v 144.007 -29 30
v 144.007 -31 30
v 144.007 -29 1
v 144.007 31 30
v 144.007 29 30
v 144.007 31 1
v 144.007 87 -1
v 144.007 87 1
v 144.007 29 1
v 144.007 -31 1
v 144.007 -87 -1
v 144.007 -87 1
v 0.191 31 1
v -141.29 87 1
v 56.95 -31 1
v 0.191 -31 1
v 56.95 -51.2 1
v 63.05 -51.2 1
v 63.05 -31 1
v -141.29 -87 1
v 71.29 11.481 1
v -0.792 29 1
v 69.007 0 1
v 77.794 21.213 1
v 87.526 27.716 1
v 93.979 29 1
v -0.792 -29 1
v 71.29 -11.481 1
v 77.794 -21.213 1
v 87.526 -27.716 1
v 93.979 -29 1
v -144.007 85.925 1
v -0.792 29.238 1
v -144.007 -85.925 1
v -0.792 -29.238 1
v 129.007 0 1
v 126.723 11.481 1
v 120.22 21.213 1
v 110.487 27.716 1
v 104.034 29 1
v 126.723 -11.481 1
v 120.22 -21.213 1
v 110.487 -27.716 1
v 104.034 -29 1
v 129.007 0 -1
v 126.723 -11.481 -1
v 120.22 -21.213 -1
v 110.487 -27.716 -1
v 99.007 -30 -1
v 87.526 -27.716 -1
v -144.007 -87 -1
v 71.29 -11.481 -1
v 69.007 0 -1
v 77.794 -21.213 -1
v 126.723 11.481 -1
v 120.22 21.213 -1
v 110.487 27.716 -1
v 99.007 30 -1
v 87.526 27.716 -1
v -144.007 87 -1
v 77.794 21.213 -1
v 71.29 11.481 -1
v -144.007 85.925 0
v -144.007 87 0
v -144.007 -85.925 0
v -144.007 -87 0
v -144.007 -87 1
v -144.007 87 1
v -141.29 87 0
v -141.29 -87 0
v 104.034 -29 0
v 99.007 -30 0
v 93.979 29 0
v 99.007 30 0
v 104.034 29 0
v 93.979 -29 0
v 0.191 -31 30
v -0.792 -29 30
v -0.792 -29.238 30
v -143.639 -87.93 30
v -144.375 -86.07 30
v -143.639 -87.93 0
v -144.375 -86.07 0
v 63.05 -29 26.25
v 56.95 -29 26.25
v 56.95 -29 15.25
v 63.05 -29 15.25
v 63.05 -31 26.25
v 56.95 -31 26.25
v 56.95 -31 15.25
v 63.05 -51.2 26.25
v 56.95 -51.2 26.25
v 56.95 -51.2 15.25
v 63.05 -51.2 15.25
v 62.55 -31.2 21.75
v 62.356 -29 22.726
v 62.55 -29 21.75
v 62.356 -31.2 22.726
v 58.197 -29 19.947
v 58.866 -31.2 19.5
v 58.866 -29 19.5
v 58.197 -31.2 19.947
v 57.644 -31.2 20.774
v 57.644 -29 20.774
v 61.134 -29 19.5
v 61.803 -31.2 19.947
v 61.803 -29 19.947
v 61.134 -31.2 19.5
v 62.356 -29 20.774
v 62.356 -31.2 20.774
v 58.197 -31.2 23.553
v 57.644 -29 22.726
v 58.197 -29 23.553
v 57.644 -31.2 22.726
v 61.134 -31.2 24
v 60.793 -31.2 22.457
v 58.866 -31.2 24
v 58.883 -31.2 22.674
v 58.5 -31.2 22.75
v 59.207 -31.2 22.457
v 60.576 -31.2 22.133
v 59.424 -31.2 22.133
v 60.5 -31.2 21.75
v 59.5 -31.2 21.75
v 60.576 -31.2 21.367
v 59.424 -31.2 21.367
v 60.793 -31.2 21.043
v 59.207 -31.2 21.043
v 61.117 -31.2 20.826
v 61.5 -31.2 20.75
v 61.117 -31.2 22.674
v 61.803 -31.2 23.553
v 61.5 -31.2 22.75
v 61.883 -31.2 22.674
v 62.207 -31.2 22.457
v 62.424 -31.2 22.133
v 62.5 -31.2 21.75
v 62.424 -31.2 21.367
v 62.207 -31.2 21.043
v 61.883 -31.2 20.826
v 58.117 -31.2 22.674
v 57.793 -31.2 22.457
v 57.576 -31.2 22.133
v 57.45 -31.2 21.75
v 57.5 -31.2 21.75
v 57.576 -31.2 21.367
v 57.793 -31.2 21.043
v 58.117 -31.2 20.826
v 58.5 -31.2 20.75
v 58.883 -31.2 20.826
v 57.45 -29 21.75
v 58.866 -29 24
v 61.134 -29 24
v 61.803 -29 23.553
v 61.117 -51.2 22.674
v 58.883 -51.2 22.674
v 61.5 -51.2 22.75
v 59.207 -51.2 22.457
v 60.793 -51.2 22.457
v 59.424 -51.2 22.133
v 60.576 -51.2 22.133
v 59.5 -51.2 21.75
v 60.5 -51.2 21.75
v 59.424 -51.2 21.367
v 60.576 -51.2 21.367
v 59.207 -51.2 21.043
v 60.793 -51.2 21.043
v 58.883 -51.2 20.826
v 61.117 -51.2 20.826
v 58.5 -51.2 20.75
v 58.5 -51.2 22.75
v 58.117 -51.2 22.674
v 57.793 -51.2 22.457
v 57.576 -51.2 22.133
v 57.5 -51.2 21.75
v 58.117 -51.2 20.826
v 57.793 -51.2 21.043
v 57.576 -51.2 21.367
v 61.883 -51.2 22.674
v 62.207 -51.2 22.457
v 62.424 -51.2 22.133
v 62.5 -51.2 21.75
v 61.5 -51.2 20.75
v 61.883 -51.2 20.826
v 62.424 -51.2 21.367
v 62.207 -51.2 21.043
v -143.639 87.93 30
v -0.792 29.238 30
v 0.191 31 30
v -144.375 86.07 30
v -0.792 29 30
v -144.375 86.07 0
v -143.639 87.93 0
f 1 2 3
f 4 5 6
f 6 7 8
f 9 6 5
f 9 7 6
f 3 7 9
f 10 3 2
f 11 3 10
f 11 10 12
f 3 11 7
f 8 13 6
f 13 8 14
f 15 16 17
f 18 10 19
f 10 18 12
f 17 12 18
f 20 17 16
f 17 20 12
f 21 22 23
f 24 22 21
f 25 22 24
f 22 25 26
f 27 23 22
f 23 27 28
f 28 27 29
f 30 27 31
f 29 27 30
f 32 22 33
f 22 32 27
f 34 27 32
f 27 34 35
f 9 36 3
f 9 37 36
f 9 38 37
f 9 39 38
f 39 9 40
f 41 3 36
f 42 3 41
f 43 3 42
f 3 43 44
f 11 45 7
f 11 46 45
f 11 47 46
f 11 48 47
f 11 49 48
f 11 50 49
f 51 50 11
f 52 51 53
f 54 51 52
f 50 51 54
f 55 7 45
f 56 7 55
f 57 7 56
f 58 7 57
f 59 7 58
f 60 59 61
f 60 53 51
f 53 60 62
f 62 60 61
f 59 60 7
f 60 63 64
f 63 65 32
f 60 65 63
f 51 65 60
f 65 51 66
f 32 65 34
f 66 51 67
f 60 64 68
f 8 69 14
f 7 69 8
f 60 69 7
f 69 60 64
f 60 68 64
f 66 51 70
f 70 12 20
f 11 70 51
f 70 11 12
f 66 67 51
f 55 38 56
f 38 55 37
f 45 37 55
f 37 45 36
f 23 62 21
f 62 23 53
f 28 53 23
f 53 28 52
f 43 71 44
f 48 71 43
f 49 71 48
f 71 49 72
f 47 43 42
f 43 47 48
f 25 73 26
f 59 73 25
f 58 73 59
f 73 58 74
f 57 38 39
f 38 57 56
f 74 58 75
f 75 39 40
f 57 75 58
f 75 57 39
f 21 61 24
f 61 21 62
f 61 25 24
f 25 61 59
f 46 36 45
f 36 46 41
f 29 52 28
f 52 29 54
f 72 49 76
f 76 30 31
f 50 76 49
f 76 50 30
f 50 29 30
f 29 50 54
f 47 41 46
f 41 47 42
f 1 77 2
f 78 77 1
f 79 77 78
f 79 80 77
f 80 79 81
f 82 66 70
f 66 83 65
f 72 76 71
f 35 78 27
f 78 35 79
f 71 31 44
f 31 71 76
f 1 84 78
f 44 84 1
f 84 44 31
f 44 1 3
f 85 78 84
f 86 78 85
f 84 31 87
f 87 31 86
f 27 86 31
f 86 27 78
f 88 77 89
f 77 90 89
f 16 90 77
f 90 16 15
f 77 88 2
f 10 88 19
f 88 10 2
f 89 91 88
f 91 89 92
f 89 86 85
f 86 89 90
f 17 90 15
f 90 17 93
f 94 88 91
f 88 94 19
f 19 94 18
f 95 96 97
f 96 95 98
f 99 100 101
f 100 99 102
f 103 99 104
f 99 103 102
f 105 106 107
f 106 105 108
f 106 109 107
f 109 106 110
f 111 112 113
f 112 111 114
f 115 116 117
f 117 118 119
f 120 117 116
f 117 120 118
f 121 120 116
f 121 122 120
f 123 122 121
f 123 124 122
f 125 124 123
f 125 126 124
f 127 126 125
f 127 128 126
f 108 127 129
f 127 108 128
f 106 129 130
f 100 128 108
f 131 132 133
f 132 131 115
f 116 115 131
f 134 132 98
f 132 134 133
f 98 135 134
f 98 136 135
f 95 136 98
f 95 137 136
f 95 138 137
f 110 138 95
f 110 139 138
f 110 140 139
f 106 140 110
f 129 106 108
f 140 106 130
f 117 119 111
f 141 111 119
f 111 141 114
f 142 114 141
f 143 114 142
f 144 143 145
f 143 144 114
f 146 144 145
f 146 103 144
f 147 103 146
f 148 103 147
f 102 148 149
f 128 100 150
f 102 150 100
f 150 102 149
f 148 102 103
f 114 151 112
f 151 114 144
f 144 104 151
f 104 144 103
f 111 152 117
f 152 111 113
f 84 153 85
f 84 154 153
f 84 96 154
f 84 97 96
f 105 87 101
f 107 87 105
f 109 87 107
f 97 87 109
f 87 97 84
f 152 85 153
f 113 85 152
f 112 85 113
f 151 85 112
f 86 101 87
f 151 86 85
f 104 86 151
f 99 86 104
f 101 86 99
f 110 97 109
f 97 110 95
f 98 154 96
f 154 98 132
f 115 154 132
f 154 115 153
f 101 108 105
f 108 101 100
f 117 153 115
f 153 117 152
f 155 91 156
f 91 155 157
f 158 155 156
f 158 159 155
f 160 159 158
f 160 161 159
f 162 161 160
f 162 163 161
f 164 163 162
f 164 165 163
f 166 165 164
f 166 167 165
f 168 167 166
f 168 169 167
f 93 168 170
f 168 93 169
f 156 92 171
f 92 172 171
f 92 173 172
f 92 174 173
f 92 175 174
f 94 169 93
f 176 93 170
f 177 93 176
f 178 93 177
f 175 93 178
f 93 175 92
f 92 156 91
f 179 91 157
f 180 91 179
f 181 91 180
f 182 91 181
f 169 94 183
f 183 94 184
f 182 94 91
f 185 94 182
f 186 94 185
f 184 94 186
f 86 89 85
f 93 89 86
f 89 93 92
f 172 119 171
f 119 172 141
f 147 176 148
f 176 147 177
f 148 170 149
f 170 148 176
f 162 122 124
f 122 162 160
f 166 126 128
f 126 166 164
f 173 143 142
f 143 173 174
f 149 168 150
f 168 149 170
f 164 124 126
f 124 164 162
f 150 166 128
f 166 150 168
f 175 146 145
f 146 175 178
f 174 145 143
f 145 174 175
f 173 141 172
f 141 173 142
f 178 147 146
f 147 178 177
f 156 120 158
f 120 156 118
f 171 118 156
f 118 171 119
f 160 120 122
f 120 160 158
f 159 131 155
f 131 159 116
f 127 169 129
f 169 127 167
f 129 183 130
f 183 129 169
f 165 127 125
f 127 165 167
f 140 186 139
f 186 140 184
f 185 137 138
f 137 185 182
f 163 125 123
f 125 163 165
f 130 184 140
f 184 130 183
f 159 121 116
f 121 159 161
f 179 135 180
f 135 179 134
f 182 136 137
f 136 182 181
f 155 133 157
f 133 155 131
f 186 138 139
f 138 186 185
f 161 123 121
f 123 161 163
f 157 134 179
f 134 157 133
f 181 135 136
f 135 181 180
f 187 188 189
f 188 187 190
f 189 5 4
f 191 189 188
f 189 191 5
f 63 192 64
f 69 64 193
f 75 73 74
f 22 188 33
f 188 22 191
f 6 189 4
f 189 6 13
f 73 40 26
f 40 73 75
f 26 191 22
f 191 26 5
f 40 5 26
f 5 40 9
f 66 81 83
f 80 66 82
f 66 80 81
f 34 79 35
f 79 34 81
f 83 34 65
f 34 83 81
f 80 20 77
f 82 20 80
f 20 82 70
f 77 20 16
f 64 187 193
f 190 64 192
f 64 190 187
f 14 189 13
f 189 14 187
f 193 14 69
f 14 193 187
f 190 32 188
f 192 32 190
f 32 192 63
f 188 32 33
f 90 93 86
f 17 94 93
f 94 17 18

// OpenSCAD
heightBox=180;
widthBox=180;
lengthBox=280;
thicknessWall=3;
fn=16;
angleToX=atan(85/(lengthBox-2*thicknessWall));
additionalSlopeHeight=2*cos(angleToX);
additionalSlopeLength=2*sin(angleToX);
lengthSlope=sqrt(pow(lengthBox-(2*thicknessWall)+(2*additionalSlopeLength), 2)+pow(85, 2));
widthSlope=widthBox-2*thicknessWall;
heightBetweenGroundAndSlopeMiddle=heightBox-2*thicknessWall-additionalSlopeHeight/2-85;
wallLength=sqrt(pow(lengthSlope/2, 2)+pow(widthSlope/2 - 30, 2));
wallAngle=atan((widthSlope/2 - 30)/(lengthSlope/2));
wallAdditionalLength=2*tan(wallAngle);
photoSensorHeightTranslation=20.25;
echo(heightBetweenGroundAndSlopeMiddle);
echo(wallAngle);

difference(){
  translate([0, 0, heightBetweenGroundAndSlopeMiddle/2 - additionalSlopeHeight/2])union(){
    
    //Querfläche + Seiten
    rotate([0, angleToX, 0])!union(){
      difference(){
        cube([lengthSlope, widthSlope, 2], center=true);
        translate([(lengthSlope-60-30)/2, 0, 0])cylinder($fn=fn, d=60, h=2, center=true);
      }
      translate([(lengthSlope/2 - wallAdditionalLength)/2, 30, 30/2])cube([lengthSlope/2 + wallAdditionalLength, 2, 30], center=true);
      difference(){
          translate([(lengthSlope/2 - wallAdditionalLength)/2, -30, 30/2])cube([lengthSlope/2 + wallAdditionalLength, 2, 30], center=true);
          translate([60, -30-22.2/2+1, photoSensorHeightTranslation])rotate([0, 90, 90])
          //Basiscubus
          translate([0, 0, 0])cube([4.5*2 + 3, 5.1+1, 22.2], center = true);
      }
      translate([-lengthSlope/4, -30/2 - widthSlope/4, 30/2])rotate([0, 0, wallAngle])cube([wallLength, 2, 30], center=true);
      translate([-lengthSlope/4, 30/2 + widthSlope/4, 30/2])rotate([0, 0, -wallAngle])cube([wallLength, 2, 30], center=true);
      
      //Gehaeuse Lichtsensor
      translate([60, -30-22.2/2+1, photoSensorHeightTranslation])rotate([0, 90, 90])difference(){
        union(){
          difference(){
          //Basiscubus
          translate([0, 0, 0])cube([4.5*2 + 3, 5.1+1, 22.2], center = true);
          //Ausschnitt Photoresitor
            translate([-3/2, 0, (22.2-2.2)/2])difference(){
              cylinder($fn = fn, d=5.1, h=2.2, center=true);
              translate([+3/2 + 4.5/2, 0, 0])cube([3, 3, 3], center = true);
              translate([-3/2 - 4.5/2, 0, 0])cube([3, 3, 3], center = true);
            }
      
          }
      }
      //Löcher Beine Lichtsensor. Höhe extra übertrieben, ging nicht anders.
      translate([-3/2,  (4-1)/2, -(22.2-20)/2])cylinder($fn = fn, d=2, h=22, center=true);
      translate([-3/2, -(4-1)/2, -(22.2-20)/2])cylinder($fn = fn, d=2, h=22, center=true);
      }
      //Stützcubus
      translate([60, -30-22.2/2+1, photoSensorHeightTranslation/2 - 2])cube([5.1+1, 22.2, photoSensorHeightTranslation - 6], center = true);
    }
    
    //Abstandhalter zu Boden
    translate([(lengthBox-(2*thicknessWall))/2 - 1, 0, -(heightBetweenGroundAndSlopeMiddle/2 + 85/2)])cube([2, widthBox, heightBetweenGroundAndSlopeMiddle], center=true);
  }



//Box

  difference(){
    cube([lengthBox + 300, widthBox + 300, heightBox + 300], center=true);
    cube([lengthBox-2*thicknessWall, widthBox-2*thicknessWall, heightBox-2*thicknessWall], center=true);
  }
}
